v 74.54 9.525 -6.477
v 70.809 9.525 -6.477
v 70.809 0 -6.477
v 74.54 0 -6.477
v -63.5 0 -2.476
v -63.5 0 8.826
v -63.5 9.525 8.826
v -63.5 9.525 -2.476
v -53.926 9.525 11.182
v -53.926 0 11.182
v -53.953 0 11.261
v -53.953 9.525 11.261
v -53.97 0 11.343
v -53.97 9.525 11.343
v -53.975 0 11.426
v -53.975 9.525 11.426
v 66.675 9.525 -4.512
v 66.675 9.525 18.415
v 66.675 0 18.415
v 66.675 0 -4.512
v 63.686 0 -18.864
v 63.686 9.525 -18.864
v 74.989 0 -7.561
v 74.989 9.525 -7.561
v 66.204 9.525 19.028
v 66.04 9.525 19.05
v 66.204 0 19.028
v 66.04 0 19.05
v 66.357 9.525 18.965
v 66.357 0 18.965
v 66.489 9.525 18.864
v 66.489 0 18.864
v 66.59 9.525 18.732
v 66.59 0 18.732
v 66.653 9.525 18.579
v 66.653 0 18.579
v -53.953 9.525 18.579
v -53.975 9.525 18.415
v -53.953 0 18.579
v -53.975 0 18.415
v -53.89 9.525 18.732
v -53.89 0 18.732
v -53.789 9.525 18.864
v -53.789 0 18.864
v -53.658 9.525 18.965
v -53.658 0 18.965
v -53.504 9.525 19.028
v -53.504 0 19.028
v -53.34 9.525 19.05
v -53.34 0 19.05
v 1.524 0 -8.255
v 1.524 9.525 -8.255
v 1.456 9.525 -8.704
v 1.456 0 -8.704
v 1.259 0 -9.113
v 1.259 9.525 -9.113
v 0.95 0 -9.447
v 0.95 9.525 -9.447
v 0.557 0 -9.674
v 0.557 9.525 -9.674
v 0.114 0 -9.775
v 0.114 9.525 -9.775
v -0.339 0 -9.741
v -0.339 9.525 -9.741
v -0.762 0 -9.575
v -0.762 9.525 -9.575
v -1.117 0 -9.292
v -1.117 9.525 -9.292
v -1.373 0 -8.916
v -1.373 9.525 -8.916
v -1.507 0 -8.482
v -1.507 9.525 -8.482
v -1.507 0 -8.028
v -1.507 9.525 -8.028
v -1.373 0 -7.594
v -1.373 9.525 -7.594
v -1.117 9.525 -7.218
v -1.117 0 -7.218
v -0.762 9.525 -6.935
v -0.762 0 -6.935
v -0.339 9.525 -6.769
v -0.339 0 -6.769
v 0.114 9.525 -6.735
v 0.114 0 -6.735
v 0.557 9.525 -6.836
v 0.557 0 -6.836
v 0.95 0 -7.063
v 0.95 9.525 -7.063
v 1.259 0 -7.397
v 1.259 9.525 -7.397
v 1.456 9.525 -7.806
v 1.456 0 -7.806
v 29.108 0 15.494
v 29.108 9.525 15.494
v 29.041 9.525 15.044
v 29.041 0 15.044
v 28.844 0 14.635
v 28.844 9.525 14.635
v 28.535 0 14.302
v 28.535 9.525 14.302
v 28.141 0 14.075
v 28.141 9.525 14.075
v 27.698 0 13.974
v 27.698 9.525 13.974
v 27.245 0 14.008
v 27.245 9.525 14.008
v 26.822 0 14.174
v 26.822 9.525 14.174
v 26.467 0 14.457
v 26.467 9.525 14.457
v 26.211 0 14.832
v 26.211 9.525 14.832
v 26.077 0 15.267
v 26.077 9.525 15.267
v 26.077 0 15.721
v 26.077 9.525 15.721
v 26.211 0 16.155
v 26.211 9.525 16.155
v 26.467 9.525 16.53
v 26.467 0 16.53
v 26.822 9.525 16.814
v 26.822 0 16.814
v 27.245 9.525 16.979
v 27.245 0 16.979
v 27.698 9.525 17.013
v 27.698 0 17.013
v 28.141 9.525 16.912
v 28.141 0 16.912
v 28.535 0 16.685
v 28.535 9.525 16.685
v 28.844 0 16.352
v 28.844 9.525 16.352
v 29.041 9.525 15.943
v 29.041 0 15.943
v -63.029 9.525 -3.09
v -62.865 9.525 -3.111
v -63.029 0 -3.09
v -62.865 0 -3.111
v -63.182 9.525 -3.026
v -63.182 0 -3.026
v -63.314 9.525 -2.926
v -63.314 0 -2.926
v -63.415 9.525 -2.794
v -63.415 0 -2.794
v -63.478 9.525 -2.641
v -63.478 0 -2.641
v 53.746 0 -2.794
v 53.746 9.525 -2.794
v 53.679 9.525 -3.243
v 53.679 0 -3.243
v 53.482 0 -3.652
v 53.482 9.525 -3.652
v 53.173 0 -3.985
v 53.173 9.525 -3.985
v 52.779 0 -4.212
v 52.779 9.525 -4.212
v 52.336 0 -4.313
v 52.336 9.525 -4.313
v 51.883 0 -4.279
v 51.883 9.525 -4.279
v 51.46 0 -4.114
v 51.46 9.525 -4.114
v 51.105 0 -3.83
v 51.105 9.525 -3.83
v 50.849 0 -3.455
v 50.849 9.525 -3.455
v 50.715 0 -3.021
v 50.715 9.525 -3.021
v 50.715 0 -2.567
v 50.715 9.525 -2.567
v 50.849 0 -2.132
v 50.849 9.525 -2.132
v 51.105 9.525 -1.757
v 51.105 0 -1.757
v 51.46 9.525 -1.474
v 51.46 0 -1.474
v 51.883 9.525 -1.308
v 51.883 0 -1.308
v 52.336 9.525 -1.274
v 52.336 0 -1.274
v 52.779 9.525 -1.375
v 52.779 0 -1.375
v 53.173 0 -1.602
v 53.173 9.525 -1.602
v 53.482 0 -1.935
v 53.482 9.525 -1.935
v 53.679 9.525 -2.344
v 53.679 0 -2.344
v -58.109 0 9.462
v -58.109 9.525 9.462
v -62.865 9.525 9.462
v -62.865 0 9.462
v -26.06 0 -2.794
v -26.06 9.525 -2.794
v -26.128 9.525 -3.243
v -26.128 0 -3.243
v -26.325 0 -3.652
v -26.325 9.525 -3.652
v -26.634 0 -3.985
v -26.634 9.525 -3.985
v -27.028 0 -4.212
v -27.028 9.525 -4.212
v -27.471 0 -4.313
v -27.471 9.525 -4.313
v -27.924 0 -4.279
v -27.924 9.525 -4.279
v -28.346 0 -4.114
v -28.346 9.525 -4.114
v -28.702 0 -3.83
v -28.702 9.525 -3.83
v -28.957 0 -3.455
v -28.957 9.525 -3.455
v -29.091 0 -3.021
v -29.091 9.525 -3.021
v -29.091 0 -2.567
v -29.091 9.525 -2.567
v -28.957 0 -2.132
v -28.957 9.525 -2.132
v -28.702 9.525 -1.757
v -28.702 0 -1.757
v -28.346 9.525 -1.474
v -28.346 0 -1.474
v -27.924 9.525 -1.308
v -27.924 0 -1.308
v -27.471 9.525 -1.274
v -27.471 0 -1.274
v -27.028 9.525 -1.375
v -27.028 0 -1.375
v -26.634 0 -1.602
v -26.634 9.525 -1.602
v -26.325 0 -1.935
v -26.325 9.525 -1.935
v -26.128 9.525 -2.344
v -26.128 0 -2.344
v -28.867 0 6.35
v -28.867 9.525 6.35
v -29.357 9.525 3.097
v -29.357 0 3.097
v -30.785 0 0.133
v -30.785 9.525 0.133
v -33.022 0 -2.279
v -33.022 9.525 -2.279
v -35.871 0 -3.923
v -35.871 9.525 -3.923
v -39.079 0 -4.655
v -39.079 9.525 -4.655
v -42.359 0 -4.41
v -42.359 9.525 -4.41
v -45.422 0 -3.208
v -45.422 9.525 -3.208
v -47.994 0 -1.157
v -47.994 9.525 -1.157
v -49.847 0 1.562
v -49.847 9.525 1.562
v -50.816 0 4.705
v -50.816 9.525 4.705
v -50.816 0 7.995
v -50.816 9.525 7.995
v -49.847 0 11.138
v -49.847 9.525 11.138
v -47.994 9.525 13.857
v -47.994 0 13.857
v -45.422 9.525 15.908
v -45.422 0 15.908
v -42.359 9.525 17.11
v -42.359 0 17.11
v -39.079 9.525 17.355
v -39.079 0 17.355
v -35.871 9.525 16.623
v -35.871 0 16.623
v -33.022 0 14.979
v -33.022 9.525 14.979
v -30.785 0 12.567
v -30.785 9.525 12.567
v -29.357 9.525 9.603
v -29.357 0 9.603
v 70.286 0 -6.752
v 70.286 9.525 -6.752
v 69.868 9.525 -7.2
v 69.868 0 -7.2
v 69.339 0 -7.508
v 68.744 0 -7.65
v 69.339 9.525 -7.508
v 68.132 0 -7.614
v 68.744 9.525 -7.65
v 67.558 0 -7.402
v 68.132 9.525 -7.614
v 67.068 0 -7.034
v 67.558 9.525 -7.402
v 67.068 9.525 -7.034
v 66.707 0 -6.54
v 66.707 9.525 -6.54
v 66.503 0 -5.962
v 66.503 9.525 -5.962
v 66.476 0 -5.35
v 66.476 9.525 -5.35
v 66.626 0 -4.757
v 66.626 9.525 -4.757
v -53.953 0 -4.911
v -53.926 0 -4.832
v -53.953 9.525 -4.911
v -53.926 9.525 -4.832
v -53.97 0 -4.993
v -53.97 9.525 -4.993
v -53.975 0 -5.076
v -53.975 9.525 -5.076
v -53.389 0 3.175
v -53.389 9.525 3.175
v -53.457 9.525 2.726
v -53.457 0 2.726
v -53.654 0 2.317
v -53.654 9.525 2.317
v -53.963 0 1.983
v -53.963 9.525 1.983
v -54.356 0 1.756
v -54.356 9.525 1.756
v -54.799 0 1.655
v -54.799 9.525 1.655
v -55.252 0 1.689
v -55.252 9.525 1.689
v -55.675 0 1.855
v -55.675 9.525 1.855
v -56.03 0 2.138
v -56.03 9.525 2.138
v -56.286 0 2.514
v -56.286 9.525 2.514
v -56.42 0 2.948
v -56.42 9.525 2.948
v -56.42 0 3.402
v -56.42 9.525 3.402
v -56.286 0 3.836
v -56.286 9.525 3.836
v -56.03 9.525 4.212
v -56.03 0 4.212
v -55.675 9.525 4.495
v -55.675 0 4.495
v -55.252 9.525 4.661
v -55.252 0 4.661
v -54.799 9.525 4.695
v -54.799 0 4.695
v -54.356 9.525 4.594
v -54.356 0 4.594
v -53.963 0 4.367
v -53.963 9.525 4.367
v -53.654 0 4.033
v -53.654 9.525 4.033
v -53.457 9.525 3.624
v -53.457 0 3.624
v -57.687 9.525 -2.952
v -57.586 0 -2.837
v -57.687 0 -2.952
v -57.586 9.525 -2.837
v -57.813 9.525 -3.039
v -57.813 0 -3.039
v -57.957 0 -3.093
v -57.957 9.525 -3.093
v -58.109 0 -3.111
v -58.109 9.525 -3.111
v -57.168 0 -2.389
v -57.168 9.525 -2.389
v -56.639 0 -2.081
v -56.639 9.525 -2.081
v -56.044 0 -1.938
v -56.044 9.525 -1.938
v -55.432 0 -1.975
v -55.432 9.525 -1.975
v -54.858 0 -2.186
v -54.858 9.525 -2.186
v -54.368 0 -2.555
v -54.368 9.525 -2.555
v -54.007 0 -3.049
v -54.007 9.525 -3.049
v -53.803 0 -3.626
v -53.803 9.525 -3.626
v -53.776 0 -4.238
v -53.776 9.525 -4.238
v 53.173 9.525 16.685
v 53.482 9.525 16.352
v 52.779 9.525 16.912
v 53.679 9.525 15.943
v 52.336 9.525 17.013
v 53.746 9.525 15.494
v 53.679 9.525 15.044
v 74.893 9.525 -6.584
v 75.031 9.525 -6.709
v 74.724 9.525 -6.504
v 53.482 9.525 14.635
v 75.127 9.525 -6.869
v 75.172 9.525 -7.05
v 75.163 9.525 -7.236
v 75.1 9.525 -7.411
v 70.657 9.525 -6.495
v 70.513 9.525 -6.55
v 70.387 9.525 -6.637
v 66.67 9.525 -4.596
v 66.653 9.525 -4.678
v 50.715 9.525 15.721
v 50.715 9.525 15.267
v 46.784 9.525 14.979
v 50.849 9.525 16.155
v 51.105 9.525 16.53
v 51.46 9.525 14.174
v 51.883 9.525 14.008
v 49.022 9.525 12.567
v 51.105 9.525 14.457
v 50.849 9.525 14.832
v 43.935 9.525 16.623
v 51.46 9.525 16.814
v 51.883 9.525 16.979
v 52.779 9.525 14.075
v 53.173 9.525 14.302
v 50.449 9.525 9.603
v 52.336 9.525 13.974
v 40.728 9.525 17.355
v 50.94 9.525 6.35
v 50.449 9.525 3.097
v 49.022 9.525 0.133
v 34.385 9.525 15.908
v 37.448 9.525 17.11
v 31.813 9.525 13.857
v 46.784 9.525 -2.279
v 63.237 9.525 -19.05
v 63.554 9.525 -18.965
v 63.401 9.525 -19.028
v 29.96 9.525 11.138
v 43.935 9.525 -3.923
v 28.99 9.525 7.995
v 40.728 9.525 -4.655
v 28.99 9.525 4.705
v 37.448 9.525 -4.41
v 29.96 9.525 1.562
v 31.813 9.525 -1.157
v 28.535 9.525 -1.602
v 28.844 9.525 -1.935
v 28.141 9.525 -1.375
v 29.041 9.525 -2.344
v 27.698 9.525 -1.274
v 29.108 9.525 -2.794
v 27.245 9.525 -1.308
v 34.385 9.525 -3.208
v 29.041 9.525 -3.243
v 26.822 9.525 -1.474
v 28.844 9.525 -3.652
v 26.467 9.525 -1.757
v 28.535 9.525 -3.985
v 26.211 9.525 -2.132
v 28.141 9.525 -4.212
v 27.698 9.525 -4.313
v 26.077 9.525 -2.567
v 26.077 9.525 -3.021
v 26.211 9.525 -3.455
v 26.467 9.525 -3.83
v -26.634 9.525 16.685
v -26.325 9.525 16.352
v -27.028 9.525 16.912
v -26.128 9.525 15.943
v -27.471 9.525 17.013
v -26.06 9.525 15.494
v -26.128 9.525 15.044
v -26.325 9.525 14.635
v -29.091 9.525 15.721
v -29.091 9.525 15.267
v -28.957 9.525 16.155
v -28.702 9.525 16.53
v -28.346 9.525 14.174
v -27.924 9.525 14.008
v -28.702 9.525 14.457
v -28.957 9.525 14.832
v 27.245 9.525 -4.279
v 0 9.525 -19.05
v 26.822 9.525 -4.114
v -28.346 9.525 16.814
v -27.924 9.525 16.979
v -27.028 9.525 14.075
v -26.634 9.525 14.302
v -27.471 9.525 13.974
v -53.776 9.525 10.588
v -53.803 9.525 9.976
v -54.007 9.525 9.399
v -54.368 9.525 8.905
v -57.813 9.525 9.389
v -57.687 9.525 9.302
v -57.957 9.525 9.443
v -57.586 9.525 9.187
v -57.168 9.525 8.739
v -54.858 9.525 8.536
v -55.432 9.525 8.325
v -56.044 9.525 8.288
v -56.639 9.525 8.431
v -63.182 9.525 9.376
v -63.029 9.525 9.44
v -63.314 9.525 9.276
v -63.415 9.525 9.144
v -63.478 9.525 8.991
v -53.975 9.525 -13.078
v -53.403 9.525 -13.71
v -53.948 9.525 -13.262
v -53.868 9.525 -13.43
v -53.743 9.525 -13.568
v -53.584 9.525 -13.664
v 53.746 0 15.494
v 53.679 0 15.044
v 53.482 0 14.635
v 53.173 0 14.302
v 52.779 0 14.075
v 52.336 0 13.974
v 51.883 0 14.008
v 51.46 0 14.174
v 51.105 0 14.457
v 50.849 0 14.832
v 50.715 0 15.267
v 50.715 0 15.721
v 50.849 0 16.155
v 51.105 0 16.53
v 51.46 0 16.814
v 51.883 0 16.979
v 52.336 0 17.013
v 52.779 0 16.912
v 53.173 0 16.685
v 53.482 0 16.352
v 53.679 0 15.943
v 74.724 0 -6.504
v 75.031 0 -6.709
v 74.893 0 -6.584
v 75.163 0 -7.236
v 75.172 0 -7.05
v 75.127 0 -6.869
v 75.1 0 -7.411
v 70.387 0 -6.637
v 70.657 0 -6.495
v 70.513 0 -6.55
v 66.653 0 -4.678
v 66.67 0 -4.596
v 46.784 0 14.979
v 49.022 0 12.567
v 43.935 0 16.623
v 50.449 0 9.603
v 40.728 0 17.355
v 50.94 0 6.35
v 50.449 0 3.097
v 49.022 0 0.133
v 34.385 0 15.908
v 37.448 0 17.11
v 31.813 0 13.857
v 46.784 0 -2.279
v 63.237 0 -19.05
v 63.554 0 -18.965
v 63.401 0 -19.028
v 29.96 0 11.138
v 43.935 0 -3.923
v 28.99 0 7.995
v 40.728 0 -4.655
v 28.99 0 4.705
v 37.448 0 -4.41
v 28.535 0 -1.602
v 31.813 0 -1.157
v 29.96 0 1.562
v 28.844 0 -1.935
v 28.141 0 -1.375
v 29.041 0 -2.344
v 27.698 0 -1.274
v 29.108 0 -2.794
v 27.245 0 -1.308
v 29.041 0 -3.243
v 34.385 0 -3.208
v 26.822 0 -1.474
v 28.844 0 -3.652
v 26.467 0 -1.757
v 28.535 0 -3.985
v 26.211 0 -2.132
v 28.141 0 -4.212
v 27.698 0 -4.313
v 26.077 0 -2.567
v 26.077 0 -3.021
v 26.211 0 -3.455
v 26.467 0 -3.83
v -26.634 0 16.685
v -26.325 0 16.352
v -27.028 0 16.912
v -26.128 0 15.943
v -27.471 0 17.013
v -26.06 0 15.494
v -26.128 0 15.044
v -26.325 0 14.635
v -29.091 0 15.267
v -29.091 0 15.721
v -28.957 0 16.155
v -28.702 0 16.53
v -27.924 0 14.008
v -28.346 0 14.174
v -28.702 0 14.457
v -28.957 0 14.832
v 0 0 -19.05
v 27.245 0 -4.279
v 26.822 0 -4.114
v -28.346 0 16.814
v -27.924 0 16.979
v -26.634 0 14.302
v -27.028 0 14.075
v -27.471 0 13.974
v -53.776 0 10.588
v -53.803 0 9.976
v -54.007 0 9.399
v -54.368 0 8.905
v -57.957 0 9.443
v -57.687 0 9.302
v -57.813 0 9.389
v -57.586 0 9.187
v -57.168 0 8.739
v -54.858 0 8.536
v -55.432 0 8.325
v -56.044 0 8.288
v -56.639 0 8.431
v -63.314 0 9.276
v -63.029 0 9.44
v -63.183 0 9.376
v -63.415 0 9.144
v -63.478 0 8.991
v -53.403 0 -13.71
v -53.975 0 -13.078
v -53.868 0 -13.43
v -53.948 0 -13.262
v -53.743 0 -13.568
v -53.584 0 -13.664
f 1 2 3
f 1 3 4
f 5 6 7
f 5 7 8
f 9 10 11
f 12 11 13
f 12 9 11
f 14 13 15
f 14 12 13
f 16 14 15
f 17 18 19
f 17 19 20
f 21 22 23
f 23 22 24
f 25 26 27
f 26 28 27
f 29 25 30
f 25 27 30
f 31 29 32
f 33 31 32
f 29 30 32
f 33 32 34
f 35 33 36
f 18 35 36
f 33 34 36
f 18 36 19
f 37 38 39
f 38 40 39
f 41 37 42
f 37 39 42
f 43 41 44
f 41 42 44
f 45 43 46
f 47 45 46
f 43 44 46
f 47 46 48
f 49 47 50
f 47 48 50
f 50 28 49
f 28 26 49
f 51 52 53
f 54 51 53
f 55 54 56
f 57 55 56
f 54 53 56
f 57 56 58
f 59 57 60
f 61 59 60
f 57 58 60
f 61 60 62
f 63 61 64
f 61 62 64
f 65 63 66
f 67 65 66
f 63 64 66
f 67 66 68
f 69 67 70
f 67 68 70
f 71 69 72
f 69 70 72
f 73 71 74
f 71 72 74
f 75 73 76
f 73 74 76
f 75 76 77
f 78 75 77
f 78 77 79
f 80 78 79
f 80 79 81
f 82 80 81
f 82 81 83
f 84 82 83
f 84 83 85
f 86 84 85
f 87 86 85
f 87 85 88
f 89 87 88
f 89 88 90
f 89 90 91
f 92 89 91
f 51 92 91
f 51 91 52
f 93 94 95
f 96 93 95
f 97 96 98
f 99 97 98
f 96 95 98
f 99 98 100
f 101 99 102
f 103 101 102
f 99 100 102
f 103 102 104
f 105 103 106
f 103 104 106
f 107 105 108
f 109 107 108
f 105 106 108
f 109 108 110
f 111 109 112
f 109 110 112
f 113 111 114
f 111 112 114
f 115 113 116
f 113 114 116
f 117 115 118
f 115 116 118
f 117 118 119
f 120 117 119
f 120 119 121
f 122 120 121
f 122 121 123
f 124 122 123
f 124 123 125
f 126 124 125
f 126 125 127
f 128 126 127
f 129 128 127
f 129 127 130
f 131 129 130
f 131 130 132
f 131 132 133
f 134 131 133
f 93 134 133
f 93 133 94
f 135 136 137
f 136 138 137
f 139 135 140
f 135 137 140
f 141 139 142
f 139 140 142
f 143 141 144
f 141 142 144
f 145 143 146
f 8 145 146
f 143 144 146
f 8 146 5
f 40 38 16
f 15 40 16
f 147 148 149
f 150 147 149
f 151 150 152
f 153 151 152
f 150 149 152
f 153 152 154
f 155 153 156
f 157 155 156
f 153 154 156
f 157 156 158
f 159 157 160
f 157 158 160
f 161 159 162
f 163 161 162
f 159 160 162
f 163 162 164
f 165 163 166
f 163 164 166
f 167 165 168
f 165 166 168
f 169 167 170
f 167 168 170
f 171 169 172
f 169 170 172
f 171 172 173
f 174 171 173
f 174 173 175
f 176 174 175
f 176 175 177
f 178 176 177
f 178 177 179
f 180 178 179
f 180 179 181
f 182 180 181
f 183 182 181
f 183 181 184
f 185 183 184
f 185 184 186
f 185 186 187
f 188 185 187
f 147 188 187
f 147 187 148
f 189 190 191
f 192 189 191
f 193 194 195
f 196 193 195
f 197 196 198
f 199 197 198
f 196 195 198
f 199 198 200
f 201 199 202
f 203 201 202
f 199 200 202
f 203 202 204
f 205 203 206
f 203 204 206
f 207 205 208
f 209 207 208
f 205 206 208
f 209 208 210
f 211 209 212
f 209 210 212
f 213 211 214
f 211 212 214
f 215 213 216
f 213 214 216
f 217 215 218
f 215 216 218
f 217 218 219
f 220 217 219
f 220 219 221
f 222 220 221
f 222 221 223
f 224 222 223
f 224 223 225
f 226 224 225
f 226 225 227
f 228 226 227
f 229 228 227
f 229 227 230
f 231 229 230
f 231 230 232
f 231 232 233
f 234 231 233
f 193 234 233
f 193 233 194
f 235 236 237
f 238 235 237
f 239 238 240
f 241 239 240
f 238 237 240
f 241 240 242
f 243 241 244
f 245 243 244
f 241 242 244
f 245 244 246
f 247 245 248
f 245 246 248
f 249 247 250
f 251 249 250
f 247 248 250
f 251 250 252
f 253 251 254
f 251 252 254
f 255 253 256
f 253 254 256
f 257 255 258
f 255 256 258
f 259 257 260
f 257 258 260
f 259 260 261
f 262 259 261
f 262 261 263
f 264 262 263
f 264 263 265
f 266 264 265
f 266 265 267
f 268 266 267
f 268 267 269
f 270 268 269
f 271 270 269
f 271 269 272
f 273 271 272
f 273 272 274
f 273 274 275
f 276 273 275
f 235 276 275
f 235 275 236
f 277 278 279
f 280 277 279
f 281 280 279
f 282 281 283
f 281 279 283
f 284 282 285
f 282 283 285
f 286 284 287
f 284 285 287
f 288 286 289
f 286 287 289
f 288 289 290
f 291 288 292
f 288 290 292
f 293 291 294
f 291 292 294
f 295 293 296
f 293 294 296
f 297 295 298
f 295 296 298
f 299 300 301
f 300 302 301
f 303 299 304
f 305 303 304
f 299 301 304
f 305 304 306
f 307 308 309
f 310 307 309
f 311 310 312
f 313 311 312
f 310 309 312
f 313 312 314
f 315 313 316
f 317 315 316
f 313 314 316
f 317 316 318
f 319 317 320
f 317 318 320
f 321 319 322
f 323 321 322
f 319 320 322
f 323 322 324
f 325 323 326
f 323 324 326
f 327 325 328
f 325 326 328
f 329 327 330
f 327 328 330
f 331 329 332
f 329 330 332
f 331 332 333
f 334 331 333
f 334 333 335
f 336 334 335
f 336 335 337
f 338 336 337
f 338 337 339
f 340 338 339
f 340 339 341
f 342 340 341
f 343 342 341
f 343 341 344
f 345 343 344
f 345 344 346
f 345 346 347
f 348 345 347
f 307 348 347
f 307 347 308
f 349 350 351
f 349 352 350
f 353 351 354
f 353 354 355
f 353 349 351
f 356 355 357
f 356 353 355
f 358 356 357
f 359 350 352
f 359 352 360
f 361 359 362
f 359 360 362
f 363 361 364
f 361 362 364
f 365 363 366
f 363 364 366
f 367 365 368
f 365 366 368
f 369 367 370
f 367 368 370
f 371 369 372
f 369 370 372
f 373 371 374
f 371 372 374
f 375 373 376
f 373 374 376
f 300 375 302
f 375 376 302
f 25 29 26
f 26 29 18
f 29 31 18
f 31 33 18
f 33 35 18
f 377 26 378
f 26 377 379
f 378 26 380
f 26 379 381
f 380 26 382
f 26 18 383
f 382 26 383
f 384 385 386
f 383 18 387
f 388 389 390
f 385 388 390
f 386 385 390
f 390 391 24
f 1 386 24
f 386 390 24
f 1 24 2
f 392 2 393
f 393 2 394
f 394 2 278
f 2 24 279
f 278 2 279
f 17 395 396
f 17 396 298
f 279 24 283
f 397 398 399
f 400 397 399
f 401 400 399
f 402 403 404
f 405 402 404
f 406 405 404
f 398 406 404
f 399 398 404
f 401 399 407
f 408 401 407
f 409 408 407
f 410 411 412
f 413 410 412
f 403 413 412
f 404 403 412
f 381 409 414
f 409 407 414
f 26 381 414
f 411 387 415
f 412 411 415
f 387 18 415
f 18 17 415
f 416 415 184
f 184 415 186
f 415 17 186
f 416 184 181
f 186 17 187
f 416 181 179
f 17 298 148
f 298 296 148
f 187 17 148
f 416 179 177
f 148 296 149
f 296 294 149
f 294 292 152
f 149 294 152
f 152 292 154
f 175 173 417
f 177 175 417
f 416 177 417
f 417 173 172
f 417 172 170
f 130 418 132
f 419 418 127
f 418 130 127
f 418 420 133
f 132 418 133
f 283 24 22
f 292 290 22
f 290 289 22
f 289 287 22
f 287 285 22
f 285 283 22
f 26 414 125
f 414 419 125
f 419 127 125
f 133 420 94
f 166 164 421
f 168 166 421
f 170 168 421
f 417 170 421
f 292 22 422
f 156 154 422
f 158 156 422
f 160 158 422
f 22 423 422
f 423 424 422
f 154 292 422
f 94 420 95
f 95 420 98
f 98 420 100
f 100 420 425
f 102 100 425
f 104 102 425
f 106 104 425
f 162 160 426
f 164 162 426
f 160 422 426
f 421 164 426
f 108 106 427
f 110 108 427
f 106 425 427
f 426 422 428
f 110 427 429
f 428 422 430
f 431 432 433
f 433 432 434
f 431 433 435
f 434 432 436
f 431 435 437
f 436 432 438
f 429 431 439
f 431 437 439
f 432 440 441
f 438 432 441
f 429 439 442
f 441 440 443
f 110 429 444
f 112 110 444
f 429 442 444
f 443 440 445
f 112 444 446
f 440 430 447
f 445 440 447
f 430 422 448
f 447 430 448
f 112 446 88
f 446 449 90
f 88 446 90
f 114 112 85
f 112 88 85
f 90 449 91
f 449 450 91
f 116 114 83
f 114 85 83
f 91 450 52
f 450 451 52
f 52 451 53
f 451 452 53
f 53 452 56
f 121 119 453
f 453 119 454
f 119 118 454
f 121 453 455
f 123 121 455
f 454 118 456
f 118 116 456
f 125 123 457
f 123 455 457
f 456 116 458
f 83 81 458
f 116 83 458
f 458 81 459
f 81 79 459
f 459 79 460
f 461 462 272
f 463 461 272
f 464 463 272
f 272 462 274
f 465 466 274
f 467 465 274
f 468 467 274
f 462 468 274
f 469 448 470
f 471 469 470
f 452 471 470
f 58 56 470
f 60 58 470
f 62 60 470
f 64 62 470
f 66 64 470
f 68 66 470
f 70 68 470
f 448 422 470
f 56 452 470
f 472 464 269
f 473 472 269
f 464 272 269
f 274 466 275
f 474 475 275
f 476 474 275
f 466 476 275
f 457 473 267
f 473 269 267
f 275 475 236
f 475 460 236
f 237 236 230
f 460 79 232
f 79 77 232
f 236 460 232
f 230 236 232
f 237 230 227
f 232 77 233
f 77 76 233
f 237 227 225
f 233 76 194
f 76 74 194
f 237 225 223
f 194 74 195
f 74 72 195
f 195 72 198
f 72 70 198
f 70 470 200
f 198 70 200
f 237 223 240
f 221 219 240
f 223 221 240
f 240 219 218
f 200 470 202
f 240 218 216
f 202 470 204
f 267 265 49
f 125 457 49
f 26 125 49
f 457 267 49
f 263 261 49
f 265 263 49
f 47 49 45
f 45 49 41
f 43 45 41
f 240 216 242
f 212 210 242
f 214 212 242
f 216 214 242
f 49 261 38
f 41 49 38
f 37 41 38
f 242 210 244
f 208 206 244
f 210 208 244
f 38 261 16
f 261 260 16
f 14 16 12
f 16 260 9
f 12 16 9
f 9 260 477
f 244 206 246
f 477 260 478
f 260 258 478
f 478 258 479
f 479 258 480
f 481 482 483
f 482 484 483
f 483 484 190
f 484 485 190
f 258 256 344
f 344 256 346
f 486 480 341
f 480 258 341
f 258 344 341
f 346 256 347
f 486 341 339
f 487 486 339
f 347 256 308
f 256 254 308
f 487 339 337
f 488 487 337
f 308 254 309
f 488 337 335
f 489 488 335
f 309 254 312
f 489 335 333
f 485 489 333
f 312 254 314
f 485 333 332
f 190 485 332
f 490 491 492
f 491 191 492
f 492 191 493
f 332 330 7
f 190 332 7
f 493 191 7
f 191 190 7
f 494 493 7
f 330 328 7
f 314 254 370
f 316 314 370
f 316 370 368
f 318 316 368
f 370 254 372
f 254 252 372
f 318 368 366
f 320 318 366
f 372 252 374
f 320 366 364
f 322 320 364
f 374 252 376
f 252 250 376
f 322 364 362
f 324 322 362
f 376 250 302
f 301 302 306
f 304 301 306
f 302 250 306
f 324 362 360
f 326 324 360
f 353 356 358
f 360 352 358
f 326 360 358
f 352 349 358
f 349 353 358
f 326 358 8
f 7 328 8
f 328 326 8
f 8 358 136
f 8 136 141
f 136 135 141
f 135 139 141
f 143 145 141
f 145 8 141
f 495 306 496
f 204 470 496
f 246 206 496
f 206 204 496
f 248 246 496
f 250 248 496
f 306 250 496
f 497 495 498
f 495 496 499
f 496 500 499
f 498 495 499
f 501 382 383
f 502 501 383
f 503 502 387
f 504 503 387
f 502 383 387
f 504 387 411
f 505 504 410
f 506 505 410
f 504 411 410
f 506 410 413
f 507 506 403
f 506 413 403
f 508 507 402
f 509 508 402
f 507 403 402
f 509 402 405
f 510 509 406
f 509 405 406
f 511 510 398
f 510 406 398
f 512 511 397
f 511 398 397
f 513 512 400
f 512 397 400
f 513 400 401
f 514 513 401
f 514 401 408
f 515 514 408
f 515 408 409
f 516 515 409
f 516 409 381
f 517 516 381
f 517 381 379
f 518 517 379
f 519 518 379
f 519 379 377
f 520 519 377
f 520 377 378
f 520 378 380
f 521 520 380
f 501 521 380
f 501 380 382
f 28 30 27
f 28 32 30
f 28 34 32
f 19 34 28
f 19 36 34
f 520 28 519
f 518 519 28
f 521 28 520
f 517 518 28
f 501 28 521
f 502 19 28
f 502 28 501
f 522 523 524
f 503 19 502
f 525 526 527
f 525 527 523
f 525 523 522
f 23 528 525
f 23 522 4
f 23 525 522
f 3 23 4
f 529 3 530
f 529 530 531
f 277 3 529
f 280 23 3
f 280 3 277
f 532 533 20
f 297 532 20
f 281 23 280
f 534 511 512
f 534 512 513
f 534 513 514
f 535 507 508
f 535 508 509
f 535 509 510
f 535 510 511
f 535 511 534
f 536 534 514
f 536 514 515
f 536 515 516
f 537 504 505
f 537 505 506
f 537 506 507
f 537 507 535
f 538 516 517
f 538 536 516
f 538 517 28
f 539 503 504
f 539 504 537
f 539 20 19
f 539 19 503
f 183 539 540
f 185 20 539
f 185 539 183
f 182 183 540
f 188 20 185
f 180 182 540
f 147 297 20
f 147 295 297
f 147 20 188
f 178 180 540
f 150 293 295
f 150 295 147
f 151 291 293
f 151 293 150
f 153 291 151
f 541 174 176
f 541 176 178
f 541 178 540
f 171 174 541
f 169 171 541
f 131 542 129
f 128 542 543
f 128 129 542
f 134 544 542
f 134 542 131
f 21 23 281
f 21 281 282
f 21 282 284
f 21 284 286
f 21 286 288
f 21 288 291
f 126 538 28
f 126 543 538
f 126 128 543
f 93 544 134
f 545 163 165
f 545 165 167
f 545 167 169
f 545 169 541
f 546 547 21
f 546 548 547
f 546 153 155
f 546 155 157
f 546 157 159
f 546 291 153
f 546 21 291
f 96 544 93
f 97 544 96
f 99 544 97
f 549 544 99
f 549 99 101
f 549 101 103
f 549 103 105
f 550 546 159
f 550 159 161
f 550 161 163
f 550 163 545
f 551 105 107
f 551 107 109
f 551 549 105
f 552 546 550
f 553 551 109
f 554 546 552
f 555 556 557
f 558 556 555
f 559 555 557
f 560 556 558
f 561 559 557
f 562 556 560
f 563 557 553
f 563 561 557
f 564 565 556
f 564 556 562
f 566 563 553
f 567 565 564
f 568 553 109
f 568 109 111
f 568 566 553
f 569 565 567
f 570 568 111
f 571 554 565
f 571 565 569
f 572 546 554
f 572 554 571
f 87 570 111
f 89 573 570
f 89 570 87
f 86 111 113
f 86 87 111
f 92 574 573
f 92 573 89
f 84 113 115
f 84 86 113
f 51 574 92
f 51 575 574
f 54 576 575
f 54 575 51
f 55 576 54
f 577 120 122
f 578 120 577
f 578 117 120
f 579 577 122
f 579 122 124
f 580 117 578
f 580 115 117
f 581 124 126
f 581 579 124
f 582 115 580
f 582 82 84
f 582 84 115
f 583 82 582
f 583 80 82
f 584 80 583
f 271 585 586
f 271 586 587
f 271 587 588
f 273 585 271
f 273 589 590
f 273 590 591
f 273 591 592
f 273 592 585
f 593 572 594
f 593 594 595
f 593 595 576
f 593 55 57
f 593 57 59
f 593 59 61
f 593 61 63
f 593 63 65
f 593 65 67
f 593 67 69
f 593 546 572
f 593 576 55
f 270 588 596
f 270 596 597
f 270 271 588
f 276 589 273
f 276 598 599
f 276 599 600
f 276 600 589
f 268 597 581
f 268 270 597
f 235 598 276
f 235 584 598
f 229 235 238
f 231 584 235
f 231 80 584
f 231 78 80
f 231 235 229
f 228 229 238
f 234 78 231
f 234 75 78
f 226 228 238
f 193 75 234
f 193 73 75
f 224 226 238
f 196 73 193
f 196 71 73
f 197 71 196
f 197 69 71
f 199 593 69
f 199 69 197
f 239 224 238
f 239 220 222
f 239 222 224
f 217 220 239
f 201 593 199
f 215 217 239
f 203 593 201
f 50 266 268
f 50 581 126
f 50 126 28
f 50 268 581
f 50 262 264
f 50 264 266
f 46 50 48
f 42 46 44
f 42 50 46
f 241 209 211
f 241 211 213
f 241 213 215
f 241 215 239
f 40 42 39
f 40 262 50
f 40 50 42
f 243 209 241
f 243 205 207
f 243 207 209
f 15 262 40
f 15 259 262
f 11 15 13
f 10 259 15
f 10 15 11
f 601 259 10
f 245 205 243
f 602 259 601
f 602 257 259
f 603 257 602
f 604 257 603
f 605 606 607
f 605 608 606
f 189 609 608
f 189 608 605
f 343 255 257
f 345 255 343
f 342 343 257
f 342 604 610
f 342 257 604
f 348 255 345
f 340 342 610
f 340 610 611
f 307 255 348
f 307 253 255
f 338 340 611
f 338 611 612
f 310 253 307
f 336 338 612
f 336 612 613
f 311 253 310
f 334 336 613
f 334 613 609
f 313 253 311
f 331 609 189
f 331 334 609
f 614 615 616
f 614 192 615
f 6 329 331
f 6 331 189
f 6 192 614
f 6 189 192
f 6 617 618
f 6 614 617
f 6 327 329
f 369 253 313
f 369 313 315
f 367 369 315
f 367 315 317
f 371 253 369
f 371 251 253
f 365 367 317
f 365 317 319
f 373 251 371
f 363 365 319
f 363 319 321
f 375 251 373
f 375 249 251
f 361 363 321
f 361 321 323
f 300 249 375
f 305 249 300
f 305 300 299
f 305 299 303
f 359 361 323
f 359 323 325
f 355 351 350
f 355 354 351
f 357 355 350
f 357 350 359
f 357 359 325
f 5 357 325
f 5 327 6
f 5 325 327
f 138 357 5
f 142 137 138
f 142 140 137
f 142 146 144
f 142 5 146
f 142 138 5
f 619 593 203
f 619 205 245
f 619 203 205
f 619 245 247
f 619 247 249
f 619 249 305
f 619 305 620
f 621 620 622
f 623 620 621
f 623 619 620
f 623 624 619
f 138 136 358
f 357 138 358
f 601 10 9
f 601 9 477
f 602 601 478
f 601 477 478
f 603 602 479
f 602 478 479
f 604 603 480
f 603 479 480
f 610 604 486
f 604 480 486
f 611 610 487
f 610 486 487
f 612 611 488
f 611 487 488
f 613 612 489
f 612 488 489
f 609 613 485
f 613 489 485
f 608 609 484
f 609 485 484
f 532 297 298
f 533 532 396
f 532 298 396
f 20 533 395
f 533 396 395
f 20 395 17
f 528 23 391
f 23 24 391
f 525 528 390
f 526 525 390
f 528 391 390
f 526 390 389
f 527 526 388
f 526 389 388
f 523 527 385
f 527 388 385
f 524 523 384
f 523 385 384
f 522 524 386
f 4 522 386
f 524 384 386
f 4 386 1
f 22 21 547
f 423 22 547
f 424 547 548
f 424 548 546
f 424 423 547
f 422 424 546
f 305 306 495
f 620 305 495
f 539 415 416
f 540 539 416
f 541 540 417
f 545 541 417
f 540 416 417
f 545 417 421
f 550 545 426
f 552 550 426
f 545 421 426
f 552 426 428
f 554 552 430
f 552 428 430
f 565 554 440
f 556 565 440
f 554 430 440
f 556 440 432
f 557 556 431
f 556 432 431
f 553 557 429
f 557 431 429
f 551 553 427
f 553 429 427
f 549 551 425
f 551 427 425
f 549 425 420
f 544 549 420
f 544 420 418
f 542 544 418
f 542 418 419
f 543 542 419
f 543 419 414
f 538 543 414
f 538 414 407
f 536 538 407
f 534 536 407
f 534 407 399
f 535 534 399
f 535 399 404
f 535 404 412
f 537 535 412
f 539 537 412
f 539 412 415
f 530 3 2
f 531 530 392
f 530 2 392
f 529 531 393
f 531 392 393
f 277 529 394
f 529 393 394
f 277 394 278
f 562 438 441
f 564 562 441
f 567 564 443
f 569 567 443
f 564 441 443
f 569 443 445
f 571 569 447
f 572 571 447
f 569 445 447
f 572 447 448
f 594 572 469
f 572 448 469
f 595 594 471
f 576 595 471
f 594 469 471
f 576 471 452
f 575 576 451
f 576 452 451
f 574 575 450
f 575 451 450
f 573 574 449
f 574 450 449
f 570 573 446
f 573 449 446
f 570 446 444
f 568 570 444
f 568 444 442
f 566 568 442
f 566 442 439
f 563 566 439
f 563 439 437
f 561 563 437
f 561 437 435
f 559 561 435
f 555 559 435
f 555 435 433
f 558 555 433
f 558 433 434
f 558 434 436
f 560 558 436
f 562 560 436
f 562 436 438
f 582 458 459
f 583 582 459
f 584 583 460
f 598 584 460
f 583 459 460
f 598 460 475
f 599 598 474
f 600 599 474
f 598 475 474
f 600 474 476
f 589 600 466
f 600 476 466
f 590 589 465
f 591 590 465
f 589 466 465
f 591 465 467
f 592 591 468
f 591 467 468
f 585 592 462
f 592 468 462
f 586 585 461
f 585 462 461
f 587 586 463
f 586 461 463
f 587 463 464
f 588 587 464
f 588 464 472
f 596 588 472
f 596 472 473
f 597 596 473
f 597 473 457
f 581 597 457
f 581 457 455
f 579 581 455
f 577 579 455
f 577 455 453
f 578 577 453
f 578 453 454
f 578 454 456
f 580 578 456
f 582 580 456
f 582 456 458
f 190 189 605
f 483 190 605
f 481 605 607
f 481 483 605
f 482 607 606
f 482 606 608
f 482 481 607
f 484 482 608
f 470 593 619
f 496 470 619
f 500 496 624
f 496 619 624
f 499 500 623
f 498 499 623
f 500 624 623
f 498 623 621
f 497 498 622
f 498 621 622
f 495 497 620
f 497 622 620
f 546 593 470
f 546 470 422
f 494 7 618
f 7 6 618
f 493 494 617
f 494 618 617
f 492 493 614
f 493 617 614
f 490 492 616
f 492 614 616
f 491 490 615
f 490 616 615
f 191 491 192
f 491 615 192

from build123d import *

# Parameters (mm, degrees)
SKETCH1_W           = 127
SKETCH1_H           = 38.1
BOSS_EXTRUDE1_DEPTH = 9.525
CUT_EXTRUDE2_DEPTH  = 10.525
SKETCH4_R           = 2.2225
CUT_EXTRUDE3_DEPTH  = 10.525
SKETCH5_R           = 3.1115
CUT_EXTRUDE4_DEPTH  = 2.5
SKETCH7_R           = 1.3890625
CUT_EXTRUDE6_DEPTH  = 10.525
SKETCH8_R           = 11.0363
CUT_EXTRUDE7_DEPTH  = 10.525
SKETCH9_R           = 1.524
CUT_EXTRUDE8_DEPTH  = 10.525
BOSS_EXTRUDE3_DEPTH = 9.525
SKETCH11_R          = 1.3890625
CUT_EXTRUDE9_DEPTH  = 10.525
CUT_EXTRUDE10_DEPTH = 10.525
SKETCH14_R          = 2.0955
CUT_EXTRUDE11_DEPTH = 10.525
SKETCH15_W          = 9.525
SKETCH15_H          = 25.527
CUT_EXTRUDE12_DEPTH = 10.525
SKETCH16_R          = 2.0955
CUT_EXTRUDE13_DEPTH = 10.525
SKETCH17_R          = 1.524
CUT_EXTRUDE14_DEPTH = 10.525
FILLET1_R           = 0.635


with BuildPart() as part:
    # Sketch1 → Boss-Extrude1 (new body)
    with BuildSketch(Plane(origin=(0, 0, 0), x_dir=(1, 0, 0), z_dir=(0, 1, 0))):
        Rectangle(SKETCH1_W, SKETCH1_H)
    extrude(amount=BOSS_EXTRUDE1_DEPTH)

    # Sketch3 → Cut-Extrude2 (cut, through all)
    with BuildSketch(Plane.XZ):
        Polygon((0, -19.05), (-63.5, -12.7), (-63.5, -19.05), align=None)
    extrude(amount=-CUT_EXTRUDE2_DEPTH, mode=Mode.SUBTRACT)

    # Sketch4 → Cut-Extrude3 (cut, through all)
    with BuildSketch(Plane(origin=(0, 9.525, 0), x_dir=(1, 0, 0), z_dir=(0, 1, 0))):
        with Locations((-39.9034, -6.35)):
            Circle(SKETCH4_R)
        with Locations((39.9034, -6.35)):
            Circle(SKETCH4_R)
    extrude(amount=-CUT_EXTRUDE3_DEPTH, mode=Mode.SUBTRACT)

    # Sketch5 → Cut-Extrude4 (cut)
    with BuildSketch(Plane(origin=(0, 9.525, 0), x_dir=(1, 0, 0), z_dir=(0, 1, 0))):
        with Locations((-39.9034, -6.35)):
            Circle(SKETCH5_R)
        with Locations((39.9034, -6.35)):
            Circle(SKETCH5_R)
    extrude(amount=-CUT_EXTRUDE4_DEPTH, mode=Mode.SUBTRACT)

    # Sketch7 → Cut-Extrude6 (cut, through all)
    with BuildSketch(Plane.XZ):
        with Locations((-58.7375, -7.9375)):
            Circle(SKETCH7_R)
        with Locations((-58.7375, 14.2875)):
            Circle(SKETCH7_R)
    extrude(amount=-CUT_EXTRUDE6_DEPTH, mode=Mode.SUBTRACT)

    # Sketch8 → Cut-Extrude7 (cut, through all)
    with BuildSketch(Plane(origin=(0, 9.525, 0), x_dir=(1, 0, 0), z_dir=(0, 1, 0))):
        with Locations((-39.9034, -6.35)):
            Circle(SKETCH8_R)
        with Locations((39.9034, -6.35)):
            Circle(SKETCH8_R)
    extrude(amount=-CUT_EXTRUDE7_DEPTH, mode=Mode.SUBTRACT)

    # Sketch9 → Cut-Extrude8 (cut, through all)
    with BuildSketch(Plane(origin=(0, 9.525, 0), x_dir=(1, 0, 0), z_dir=(0, 1, 0))):
        with Locations((0, 8.255)):
            Circle(SKETCH9_R)
    extrude(amount=-CUT_EXTRUDE8_DEPTH, mode=Mode.SUBTRACT)

    # Sketch10 → Boss-Extrude3 (add, through all)
    with BuildSketch(Plane(origin=(0, 9.525, 0), x_dir=(1, 0, 0), z_dir=(0, 1, 0))):
        Polygon((63.5, -19.05), (63.5, 19.05), (76.2, 6.35), (76.2, -19.05), align=None)
    extrude(amount=-BOSS_EXTRUDE3_DEPTH)

    # Sketch11 → Cut-Extrude9 (cut, through all)
    with BuildSketch(Plane(origin=(0, 9.525, 0), x_dir=(1, 0, 0), z_dir=(0, 1, 0))):
        with Locations((71.4375, 1.5875)):
            Circle(SKETCH11_R)
        with Locations((71.4375, -14.2875)):
            Circle(SKETCH11_R)
    extrude(amount=-CUT_EXTRUDE9_DEPTH, mode=Mode.SUBTRACT)

    # Sketch13 → Cut-Extrude10 (cut, through all)
    with BuildSketch(Plane(origin=(0, 9.525, 0), x_dir=(1, 0, 0), z_dir=(0, 1, 0))):
        Polygon((-63.5, -19.05), (-53.975, -19.05), (-53.975, -9.4615), (-63.5, -9.4615), (-63.5, -14.2875), align=None)
        Polygon((-63.5, 12.7), (-63.5, 3.1115), (-53.975, 3.1115), (-53.975, 12.7), (-53.975, 13.6525), align=None)
    extrude(amount=-CUT_EXTRUDE10_DEPTH, mode=Mode.SUBTRACT)

    # Sketch14 → Cut-Extrude11 (cut, through all)
    with BuildSketch(Plane(origin=(0, 9.525, 0), x_dir=(1, 0, 0), z_dir=(0, 1, 0))):
        with Locations((-55.860468878, 4.0259)):
            Circle(SKETCH14_R)
        with Locations((-55.860468878, -10.3759)):
            Circle(SKETCH14_R)
    extrude(amount=-CUT_EXTRUDE11_DEPTH, mode=Mode.SUBTRACT)

    # Sketch15 → Cut-Extrude12 (cut, through all)
    with BuildSketch(Plane(origin=(0, 9.525, 0), x_dir=(1, 0, 0), z_dir=(0, 1, 0))):
        with Locations((71.4375, -6.2865)):
            Rectangle(SKETCH15_W, SKETCH15_H)
    extrude(amount=-CUT_EXTRUDE12_DEPTH, mode=Mode.SUBTRACT)

    # Sketch16 → Cut-Extrude13 (cut, through all)
    with BuildSketch(Plane(origin=(0, 9.525, 0), x_dir=(1, 0, 0), z_dir=(0, 1, 0))):
        with Locations((68.560468878, 5.5626)):
            Circle(SKETCH16_R)
    extrude(amount=-CUT_EXTRUDE13_DEPTH, mode=Mode.SUBTRACT)

    # Sketch17 → Cut-Extrude14 (cut, through all)
    with BuildSketch(Plane(origin=(0, 9.525, 0), x_dir=(1, 0, 0), z_dir=(0, 1, 0))):
        with Locations((-54.912865865, -3.175)):
            Circle(SKETCH17_R)
        with Locations((-27.5844, 2.793682494)):
            Circle(SKETCH17_R)
        with Locations((-27.5844, -15.493682494)):
            Circle(SKETCH17_R)
        with Locations((27.5844, -15.493682494)):
            Circle(SKETCH17_R)
        with Locations((27.5844, 2.793682494)):
            Circle(SKETCH17_R)
        with Locations((52.2224, 2.793682494)):
            Circle(SKETCH17_R)
        with Locations((52.2224, -15.493682494)):
            Circle(SKETCH17_R)
    extrude(amount=-CUT_EXTRUDE14_DEPTH, mode=Mode.SUBTRACT)

    # Fillet1
    fillet1_edges = [part.edges().sort_by_distance(p)[0] for p in [
        (-63.5, 4.7625, 9.4615),
        (-53.975, 4.7625, 19.05),
        (-53.975, 4.7625, -13.6525),
        (-63.5, 4.7625, -3.1115),
        (-53.975, 4.7625, 11.2903),
        (-57.745937756, 4.7625, -3.1115),
        (-53.975, 4.7625, -4.9403),
        (-57.745937756, 4.7625, 9.4615),
        (76.073, 4.7625, -6.477),
        (66.675, 4.7625, 19.05),
        (0, 4.7625, -19.05),
        (70.445937756, 4.7625, -6.477),
        (66.675, 4.7625, -4.6482),
        (63.5, 4.7625, -19.05),
    ]]
    fillet(fillet1_edges, radius=FILLET1_R)


solid = part.part
